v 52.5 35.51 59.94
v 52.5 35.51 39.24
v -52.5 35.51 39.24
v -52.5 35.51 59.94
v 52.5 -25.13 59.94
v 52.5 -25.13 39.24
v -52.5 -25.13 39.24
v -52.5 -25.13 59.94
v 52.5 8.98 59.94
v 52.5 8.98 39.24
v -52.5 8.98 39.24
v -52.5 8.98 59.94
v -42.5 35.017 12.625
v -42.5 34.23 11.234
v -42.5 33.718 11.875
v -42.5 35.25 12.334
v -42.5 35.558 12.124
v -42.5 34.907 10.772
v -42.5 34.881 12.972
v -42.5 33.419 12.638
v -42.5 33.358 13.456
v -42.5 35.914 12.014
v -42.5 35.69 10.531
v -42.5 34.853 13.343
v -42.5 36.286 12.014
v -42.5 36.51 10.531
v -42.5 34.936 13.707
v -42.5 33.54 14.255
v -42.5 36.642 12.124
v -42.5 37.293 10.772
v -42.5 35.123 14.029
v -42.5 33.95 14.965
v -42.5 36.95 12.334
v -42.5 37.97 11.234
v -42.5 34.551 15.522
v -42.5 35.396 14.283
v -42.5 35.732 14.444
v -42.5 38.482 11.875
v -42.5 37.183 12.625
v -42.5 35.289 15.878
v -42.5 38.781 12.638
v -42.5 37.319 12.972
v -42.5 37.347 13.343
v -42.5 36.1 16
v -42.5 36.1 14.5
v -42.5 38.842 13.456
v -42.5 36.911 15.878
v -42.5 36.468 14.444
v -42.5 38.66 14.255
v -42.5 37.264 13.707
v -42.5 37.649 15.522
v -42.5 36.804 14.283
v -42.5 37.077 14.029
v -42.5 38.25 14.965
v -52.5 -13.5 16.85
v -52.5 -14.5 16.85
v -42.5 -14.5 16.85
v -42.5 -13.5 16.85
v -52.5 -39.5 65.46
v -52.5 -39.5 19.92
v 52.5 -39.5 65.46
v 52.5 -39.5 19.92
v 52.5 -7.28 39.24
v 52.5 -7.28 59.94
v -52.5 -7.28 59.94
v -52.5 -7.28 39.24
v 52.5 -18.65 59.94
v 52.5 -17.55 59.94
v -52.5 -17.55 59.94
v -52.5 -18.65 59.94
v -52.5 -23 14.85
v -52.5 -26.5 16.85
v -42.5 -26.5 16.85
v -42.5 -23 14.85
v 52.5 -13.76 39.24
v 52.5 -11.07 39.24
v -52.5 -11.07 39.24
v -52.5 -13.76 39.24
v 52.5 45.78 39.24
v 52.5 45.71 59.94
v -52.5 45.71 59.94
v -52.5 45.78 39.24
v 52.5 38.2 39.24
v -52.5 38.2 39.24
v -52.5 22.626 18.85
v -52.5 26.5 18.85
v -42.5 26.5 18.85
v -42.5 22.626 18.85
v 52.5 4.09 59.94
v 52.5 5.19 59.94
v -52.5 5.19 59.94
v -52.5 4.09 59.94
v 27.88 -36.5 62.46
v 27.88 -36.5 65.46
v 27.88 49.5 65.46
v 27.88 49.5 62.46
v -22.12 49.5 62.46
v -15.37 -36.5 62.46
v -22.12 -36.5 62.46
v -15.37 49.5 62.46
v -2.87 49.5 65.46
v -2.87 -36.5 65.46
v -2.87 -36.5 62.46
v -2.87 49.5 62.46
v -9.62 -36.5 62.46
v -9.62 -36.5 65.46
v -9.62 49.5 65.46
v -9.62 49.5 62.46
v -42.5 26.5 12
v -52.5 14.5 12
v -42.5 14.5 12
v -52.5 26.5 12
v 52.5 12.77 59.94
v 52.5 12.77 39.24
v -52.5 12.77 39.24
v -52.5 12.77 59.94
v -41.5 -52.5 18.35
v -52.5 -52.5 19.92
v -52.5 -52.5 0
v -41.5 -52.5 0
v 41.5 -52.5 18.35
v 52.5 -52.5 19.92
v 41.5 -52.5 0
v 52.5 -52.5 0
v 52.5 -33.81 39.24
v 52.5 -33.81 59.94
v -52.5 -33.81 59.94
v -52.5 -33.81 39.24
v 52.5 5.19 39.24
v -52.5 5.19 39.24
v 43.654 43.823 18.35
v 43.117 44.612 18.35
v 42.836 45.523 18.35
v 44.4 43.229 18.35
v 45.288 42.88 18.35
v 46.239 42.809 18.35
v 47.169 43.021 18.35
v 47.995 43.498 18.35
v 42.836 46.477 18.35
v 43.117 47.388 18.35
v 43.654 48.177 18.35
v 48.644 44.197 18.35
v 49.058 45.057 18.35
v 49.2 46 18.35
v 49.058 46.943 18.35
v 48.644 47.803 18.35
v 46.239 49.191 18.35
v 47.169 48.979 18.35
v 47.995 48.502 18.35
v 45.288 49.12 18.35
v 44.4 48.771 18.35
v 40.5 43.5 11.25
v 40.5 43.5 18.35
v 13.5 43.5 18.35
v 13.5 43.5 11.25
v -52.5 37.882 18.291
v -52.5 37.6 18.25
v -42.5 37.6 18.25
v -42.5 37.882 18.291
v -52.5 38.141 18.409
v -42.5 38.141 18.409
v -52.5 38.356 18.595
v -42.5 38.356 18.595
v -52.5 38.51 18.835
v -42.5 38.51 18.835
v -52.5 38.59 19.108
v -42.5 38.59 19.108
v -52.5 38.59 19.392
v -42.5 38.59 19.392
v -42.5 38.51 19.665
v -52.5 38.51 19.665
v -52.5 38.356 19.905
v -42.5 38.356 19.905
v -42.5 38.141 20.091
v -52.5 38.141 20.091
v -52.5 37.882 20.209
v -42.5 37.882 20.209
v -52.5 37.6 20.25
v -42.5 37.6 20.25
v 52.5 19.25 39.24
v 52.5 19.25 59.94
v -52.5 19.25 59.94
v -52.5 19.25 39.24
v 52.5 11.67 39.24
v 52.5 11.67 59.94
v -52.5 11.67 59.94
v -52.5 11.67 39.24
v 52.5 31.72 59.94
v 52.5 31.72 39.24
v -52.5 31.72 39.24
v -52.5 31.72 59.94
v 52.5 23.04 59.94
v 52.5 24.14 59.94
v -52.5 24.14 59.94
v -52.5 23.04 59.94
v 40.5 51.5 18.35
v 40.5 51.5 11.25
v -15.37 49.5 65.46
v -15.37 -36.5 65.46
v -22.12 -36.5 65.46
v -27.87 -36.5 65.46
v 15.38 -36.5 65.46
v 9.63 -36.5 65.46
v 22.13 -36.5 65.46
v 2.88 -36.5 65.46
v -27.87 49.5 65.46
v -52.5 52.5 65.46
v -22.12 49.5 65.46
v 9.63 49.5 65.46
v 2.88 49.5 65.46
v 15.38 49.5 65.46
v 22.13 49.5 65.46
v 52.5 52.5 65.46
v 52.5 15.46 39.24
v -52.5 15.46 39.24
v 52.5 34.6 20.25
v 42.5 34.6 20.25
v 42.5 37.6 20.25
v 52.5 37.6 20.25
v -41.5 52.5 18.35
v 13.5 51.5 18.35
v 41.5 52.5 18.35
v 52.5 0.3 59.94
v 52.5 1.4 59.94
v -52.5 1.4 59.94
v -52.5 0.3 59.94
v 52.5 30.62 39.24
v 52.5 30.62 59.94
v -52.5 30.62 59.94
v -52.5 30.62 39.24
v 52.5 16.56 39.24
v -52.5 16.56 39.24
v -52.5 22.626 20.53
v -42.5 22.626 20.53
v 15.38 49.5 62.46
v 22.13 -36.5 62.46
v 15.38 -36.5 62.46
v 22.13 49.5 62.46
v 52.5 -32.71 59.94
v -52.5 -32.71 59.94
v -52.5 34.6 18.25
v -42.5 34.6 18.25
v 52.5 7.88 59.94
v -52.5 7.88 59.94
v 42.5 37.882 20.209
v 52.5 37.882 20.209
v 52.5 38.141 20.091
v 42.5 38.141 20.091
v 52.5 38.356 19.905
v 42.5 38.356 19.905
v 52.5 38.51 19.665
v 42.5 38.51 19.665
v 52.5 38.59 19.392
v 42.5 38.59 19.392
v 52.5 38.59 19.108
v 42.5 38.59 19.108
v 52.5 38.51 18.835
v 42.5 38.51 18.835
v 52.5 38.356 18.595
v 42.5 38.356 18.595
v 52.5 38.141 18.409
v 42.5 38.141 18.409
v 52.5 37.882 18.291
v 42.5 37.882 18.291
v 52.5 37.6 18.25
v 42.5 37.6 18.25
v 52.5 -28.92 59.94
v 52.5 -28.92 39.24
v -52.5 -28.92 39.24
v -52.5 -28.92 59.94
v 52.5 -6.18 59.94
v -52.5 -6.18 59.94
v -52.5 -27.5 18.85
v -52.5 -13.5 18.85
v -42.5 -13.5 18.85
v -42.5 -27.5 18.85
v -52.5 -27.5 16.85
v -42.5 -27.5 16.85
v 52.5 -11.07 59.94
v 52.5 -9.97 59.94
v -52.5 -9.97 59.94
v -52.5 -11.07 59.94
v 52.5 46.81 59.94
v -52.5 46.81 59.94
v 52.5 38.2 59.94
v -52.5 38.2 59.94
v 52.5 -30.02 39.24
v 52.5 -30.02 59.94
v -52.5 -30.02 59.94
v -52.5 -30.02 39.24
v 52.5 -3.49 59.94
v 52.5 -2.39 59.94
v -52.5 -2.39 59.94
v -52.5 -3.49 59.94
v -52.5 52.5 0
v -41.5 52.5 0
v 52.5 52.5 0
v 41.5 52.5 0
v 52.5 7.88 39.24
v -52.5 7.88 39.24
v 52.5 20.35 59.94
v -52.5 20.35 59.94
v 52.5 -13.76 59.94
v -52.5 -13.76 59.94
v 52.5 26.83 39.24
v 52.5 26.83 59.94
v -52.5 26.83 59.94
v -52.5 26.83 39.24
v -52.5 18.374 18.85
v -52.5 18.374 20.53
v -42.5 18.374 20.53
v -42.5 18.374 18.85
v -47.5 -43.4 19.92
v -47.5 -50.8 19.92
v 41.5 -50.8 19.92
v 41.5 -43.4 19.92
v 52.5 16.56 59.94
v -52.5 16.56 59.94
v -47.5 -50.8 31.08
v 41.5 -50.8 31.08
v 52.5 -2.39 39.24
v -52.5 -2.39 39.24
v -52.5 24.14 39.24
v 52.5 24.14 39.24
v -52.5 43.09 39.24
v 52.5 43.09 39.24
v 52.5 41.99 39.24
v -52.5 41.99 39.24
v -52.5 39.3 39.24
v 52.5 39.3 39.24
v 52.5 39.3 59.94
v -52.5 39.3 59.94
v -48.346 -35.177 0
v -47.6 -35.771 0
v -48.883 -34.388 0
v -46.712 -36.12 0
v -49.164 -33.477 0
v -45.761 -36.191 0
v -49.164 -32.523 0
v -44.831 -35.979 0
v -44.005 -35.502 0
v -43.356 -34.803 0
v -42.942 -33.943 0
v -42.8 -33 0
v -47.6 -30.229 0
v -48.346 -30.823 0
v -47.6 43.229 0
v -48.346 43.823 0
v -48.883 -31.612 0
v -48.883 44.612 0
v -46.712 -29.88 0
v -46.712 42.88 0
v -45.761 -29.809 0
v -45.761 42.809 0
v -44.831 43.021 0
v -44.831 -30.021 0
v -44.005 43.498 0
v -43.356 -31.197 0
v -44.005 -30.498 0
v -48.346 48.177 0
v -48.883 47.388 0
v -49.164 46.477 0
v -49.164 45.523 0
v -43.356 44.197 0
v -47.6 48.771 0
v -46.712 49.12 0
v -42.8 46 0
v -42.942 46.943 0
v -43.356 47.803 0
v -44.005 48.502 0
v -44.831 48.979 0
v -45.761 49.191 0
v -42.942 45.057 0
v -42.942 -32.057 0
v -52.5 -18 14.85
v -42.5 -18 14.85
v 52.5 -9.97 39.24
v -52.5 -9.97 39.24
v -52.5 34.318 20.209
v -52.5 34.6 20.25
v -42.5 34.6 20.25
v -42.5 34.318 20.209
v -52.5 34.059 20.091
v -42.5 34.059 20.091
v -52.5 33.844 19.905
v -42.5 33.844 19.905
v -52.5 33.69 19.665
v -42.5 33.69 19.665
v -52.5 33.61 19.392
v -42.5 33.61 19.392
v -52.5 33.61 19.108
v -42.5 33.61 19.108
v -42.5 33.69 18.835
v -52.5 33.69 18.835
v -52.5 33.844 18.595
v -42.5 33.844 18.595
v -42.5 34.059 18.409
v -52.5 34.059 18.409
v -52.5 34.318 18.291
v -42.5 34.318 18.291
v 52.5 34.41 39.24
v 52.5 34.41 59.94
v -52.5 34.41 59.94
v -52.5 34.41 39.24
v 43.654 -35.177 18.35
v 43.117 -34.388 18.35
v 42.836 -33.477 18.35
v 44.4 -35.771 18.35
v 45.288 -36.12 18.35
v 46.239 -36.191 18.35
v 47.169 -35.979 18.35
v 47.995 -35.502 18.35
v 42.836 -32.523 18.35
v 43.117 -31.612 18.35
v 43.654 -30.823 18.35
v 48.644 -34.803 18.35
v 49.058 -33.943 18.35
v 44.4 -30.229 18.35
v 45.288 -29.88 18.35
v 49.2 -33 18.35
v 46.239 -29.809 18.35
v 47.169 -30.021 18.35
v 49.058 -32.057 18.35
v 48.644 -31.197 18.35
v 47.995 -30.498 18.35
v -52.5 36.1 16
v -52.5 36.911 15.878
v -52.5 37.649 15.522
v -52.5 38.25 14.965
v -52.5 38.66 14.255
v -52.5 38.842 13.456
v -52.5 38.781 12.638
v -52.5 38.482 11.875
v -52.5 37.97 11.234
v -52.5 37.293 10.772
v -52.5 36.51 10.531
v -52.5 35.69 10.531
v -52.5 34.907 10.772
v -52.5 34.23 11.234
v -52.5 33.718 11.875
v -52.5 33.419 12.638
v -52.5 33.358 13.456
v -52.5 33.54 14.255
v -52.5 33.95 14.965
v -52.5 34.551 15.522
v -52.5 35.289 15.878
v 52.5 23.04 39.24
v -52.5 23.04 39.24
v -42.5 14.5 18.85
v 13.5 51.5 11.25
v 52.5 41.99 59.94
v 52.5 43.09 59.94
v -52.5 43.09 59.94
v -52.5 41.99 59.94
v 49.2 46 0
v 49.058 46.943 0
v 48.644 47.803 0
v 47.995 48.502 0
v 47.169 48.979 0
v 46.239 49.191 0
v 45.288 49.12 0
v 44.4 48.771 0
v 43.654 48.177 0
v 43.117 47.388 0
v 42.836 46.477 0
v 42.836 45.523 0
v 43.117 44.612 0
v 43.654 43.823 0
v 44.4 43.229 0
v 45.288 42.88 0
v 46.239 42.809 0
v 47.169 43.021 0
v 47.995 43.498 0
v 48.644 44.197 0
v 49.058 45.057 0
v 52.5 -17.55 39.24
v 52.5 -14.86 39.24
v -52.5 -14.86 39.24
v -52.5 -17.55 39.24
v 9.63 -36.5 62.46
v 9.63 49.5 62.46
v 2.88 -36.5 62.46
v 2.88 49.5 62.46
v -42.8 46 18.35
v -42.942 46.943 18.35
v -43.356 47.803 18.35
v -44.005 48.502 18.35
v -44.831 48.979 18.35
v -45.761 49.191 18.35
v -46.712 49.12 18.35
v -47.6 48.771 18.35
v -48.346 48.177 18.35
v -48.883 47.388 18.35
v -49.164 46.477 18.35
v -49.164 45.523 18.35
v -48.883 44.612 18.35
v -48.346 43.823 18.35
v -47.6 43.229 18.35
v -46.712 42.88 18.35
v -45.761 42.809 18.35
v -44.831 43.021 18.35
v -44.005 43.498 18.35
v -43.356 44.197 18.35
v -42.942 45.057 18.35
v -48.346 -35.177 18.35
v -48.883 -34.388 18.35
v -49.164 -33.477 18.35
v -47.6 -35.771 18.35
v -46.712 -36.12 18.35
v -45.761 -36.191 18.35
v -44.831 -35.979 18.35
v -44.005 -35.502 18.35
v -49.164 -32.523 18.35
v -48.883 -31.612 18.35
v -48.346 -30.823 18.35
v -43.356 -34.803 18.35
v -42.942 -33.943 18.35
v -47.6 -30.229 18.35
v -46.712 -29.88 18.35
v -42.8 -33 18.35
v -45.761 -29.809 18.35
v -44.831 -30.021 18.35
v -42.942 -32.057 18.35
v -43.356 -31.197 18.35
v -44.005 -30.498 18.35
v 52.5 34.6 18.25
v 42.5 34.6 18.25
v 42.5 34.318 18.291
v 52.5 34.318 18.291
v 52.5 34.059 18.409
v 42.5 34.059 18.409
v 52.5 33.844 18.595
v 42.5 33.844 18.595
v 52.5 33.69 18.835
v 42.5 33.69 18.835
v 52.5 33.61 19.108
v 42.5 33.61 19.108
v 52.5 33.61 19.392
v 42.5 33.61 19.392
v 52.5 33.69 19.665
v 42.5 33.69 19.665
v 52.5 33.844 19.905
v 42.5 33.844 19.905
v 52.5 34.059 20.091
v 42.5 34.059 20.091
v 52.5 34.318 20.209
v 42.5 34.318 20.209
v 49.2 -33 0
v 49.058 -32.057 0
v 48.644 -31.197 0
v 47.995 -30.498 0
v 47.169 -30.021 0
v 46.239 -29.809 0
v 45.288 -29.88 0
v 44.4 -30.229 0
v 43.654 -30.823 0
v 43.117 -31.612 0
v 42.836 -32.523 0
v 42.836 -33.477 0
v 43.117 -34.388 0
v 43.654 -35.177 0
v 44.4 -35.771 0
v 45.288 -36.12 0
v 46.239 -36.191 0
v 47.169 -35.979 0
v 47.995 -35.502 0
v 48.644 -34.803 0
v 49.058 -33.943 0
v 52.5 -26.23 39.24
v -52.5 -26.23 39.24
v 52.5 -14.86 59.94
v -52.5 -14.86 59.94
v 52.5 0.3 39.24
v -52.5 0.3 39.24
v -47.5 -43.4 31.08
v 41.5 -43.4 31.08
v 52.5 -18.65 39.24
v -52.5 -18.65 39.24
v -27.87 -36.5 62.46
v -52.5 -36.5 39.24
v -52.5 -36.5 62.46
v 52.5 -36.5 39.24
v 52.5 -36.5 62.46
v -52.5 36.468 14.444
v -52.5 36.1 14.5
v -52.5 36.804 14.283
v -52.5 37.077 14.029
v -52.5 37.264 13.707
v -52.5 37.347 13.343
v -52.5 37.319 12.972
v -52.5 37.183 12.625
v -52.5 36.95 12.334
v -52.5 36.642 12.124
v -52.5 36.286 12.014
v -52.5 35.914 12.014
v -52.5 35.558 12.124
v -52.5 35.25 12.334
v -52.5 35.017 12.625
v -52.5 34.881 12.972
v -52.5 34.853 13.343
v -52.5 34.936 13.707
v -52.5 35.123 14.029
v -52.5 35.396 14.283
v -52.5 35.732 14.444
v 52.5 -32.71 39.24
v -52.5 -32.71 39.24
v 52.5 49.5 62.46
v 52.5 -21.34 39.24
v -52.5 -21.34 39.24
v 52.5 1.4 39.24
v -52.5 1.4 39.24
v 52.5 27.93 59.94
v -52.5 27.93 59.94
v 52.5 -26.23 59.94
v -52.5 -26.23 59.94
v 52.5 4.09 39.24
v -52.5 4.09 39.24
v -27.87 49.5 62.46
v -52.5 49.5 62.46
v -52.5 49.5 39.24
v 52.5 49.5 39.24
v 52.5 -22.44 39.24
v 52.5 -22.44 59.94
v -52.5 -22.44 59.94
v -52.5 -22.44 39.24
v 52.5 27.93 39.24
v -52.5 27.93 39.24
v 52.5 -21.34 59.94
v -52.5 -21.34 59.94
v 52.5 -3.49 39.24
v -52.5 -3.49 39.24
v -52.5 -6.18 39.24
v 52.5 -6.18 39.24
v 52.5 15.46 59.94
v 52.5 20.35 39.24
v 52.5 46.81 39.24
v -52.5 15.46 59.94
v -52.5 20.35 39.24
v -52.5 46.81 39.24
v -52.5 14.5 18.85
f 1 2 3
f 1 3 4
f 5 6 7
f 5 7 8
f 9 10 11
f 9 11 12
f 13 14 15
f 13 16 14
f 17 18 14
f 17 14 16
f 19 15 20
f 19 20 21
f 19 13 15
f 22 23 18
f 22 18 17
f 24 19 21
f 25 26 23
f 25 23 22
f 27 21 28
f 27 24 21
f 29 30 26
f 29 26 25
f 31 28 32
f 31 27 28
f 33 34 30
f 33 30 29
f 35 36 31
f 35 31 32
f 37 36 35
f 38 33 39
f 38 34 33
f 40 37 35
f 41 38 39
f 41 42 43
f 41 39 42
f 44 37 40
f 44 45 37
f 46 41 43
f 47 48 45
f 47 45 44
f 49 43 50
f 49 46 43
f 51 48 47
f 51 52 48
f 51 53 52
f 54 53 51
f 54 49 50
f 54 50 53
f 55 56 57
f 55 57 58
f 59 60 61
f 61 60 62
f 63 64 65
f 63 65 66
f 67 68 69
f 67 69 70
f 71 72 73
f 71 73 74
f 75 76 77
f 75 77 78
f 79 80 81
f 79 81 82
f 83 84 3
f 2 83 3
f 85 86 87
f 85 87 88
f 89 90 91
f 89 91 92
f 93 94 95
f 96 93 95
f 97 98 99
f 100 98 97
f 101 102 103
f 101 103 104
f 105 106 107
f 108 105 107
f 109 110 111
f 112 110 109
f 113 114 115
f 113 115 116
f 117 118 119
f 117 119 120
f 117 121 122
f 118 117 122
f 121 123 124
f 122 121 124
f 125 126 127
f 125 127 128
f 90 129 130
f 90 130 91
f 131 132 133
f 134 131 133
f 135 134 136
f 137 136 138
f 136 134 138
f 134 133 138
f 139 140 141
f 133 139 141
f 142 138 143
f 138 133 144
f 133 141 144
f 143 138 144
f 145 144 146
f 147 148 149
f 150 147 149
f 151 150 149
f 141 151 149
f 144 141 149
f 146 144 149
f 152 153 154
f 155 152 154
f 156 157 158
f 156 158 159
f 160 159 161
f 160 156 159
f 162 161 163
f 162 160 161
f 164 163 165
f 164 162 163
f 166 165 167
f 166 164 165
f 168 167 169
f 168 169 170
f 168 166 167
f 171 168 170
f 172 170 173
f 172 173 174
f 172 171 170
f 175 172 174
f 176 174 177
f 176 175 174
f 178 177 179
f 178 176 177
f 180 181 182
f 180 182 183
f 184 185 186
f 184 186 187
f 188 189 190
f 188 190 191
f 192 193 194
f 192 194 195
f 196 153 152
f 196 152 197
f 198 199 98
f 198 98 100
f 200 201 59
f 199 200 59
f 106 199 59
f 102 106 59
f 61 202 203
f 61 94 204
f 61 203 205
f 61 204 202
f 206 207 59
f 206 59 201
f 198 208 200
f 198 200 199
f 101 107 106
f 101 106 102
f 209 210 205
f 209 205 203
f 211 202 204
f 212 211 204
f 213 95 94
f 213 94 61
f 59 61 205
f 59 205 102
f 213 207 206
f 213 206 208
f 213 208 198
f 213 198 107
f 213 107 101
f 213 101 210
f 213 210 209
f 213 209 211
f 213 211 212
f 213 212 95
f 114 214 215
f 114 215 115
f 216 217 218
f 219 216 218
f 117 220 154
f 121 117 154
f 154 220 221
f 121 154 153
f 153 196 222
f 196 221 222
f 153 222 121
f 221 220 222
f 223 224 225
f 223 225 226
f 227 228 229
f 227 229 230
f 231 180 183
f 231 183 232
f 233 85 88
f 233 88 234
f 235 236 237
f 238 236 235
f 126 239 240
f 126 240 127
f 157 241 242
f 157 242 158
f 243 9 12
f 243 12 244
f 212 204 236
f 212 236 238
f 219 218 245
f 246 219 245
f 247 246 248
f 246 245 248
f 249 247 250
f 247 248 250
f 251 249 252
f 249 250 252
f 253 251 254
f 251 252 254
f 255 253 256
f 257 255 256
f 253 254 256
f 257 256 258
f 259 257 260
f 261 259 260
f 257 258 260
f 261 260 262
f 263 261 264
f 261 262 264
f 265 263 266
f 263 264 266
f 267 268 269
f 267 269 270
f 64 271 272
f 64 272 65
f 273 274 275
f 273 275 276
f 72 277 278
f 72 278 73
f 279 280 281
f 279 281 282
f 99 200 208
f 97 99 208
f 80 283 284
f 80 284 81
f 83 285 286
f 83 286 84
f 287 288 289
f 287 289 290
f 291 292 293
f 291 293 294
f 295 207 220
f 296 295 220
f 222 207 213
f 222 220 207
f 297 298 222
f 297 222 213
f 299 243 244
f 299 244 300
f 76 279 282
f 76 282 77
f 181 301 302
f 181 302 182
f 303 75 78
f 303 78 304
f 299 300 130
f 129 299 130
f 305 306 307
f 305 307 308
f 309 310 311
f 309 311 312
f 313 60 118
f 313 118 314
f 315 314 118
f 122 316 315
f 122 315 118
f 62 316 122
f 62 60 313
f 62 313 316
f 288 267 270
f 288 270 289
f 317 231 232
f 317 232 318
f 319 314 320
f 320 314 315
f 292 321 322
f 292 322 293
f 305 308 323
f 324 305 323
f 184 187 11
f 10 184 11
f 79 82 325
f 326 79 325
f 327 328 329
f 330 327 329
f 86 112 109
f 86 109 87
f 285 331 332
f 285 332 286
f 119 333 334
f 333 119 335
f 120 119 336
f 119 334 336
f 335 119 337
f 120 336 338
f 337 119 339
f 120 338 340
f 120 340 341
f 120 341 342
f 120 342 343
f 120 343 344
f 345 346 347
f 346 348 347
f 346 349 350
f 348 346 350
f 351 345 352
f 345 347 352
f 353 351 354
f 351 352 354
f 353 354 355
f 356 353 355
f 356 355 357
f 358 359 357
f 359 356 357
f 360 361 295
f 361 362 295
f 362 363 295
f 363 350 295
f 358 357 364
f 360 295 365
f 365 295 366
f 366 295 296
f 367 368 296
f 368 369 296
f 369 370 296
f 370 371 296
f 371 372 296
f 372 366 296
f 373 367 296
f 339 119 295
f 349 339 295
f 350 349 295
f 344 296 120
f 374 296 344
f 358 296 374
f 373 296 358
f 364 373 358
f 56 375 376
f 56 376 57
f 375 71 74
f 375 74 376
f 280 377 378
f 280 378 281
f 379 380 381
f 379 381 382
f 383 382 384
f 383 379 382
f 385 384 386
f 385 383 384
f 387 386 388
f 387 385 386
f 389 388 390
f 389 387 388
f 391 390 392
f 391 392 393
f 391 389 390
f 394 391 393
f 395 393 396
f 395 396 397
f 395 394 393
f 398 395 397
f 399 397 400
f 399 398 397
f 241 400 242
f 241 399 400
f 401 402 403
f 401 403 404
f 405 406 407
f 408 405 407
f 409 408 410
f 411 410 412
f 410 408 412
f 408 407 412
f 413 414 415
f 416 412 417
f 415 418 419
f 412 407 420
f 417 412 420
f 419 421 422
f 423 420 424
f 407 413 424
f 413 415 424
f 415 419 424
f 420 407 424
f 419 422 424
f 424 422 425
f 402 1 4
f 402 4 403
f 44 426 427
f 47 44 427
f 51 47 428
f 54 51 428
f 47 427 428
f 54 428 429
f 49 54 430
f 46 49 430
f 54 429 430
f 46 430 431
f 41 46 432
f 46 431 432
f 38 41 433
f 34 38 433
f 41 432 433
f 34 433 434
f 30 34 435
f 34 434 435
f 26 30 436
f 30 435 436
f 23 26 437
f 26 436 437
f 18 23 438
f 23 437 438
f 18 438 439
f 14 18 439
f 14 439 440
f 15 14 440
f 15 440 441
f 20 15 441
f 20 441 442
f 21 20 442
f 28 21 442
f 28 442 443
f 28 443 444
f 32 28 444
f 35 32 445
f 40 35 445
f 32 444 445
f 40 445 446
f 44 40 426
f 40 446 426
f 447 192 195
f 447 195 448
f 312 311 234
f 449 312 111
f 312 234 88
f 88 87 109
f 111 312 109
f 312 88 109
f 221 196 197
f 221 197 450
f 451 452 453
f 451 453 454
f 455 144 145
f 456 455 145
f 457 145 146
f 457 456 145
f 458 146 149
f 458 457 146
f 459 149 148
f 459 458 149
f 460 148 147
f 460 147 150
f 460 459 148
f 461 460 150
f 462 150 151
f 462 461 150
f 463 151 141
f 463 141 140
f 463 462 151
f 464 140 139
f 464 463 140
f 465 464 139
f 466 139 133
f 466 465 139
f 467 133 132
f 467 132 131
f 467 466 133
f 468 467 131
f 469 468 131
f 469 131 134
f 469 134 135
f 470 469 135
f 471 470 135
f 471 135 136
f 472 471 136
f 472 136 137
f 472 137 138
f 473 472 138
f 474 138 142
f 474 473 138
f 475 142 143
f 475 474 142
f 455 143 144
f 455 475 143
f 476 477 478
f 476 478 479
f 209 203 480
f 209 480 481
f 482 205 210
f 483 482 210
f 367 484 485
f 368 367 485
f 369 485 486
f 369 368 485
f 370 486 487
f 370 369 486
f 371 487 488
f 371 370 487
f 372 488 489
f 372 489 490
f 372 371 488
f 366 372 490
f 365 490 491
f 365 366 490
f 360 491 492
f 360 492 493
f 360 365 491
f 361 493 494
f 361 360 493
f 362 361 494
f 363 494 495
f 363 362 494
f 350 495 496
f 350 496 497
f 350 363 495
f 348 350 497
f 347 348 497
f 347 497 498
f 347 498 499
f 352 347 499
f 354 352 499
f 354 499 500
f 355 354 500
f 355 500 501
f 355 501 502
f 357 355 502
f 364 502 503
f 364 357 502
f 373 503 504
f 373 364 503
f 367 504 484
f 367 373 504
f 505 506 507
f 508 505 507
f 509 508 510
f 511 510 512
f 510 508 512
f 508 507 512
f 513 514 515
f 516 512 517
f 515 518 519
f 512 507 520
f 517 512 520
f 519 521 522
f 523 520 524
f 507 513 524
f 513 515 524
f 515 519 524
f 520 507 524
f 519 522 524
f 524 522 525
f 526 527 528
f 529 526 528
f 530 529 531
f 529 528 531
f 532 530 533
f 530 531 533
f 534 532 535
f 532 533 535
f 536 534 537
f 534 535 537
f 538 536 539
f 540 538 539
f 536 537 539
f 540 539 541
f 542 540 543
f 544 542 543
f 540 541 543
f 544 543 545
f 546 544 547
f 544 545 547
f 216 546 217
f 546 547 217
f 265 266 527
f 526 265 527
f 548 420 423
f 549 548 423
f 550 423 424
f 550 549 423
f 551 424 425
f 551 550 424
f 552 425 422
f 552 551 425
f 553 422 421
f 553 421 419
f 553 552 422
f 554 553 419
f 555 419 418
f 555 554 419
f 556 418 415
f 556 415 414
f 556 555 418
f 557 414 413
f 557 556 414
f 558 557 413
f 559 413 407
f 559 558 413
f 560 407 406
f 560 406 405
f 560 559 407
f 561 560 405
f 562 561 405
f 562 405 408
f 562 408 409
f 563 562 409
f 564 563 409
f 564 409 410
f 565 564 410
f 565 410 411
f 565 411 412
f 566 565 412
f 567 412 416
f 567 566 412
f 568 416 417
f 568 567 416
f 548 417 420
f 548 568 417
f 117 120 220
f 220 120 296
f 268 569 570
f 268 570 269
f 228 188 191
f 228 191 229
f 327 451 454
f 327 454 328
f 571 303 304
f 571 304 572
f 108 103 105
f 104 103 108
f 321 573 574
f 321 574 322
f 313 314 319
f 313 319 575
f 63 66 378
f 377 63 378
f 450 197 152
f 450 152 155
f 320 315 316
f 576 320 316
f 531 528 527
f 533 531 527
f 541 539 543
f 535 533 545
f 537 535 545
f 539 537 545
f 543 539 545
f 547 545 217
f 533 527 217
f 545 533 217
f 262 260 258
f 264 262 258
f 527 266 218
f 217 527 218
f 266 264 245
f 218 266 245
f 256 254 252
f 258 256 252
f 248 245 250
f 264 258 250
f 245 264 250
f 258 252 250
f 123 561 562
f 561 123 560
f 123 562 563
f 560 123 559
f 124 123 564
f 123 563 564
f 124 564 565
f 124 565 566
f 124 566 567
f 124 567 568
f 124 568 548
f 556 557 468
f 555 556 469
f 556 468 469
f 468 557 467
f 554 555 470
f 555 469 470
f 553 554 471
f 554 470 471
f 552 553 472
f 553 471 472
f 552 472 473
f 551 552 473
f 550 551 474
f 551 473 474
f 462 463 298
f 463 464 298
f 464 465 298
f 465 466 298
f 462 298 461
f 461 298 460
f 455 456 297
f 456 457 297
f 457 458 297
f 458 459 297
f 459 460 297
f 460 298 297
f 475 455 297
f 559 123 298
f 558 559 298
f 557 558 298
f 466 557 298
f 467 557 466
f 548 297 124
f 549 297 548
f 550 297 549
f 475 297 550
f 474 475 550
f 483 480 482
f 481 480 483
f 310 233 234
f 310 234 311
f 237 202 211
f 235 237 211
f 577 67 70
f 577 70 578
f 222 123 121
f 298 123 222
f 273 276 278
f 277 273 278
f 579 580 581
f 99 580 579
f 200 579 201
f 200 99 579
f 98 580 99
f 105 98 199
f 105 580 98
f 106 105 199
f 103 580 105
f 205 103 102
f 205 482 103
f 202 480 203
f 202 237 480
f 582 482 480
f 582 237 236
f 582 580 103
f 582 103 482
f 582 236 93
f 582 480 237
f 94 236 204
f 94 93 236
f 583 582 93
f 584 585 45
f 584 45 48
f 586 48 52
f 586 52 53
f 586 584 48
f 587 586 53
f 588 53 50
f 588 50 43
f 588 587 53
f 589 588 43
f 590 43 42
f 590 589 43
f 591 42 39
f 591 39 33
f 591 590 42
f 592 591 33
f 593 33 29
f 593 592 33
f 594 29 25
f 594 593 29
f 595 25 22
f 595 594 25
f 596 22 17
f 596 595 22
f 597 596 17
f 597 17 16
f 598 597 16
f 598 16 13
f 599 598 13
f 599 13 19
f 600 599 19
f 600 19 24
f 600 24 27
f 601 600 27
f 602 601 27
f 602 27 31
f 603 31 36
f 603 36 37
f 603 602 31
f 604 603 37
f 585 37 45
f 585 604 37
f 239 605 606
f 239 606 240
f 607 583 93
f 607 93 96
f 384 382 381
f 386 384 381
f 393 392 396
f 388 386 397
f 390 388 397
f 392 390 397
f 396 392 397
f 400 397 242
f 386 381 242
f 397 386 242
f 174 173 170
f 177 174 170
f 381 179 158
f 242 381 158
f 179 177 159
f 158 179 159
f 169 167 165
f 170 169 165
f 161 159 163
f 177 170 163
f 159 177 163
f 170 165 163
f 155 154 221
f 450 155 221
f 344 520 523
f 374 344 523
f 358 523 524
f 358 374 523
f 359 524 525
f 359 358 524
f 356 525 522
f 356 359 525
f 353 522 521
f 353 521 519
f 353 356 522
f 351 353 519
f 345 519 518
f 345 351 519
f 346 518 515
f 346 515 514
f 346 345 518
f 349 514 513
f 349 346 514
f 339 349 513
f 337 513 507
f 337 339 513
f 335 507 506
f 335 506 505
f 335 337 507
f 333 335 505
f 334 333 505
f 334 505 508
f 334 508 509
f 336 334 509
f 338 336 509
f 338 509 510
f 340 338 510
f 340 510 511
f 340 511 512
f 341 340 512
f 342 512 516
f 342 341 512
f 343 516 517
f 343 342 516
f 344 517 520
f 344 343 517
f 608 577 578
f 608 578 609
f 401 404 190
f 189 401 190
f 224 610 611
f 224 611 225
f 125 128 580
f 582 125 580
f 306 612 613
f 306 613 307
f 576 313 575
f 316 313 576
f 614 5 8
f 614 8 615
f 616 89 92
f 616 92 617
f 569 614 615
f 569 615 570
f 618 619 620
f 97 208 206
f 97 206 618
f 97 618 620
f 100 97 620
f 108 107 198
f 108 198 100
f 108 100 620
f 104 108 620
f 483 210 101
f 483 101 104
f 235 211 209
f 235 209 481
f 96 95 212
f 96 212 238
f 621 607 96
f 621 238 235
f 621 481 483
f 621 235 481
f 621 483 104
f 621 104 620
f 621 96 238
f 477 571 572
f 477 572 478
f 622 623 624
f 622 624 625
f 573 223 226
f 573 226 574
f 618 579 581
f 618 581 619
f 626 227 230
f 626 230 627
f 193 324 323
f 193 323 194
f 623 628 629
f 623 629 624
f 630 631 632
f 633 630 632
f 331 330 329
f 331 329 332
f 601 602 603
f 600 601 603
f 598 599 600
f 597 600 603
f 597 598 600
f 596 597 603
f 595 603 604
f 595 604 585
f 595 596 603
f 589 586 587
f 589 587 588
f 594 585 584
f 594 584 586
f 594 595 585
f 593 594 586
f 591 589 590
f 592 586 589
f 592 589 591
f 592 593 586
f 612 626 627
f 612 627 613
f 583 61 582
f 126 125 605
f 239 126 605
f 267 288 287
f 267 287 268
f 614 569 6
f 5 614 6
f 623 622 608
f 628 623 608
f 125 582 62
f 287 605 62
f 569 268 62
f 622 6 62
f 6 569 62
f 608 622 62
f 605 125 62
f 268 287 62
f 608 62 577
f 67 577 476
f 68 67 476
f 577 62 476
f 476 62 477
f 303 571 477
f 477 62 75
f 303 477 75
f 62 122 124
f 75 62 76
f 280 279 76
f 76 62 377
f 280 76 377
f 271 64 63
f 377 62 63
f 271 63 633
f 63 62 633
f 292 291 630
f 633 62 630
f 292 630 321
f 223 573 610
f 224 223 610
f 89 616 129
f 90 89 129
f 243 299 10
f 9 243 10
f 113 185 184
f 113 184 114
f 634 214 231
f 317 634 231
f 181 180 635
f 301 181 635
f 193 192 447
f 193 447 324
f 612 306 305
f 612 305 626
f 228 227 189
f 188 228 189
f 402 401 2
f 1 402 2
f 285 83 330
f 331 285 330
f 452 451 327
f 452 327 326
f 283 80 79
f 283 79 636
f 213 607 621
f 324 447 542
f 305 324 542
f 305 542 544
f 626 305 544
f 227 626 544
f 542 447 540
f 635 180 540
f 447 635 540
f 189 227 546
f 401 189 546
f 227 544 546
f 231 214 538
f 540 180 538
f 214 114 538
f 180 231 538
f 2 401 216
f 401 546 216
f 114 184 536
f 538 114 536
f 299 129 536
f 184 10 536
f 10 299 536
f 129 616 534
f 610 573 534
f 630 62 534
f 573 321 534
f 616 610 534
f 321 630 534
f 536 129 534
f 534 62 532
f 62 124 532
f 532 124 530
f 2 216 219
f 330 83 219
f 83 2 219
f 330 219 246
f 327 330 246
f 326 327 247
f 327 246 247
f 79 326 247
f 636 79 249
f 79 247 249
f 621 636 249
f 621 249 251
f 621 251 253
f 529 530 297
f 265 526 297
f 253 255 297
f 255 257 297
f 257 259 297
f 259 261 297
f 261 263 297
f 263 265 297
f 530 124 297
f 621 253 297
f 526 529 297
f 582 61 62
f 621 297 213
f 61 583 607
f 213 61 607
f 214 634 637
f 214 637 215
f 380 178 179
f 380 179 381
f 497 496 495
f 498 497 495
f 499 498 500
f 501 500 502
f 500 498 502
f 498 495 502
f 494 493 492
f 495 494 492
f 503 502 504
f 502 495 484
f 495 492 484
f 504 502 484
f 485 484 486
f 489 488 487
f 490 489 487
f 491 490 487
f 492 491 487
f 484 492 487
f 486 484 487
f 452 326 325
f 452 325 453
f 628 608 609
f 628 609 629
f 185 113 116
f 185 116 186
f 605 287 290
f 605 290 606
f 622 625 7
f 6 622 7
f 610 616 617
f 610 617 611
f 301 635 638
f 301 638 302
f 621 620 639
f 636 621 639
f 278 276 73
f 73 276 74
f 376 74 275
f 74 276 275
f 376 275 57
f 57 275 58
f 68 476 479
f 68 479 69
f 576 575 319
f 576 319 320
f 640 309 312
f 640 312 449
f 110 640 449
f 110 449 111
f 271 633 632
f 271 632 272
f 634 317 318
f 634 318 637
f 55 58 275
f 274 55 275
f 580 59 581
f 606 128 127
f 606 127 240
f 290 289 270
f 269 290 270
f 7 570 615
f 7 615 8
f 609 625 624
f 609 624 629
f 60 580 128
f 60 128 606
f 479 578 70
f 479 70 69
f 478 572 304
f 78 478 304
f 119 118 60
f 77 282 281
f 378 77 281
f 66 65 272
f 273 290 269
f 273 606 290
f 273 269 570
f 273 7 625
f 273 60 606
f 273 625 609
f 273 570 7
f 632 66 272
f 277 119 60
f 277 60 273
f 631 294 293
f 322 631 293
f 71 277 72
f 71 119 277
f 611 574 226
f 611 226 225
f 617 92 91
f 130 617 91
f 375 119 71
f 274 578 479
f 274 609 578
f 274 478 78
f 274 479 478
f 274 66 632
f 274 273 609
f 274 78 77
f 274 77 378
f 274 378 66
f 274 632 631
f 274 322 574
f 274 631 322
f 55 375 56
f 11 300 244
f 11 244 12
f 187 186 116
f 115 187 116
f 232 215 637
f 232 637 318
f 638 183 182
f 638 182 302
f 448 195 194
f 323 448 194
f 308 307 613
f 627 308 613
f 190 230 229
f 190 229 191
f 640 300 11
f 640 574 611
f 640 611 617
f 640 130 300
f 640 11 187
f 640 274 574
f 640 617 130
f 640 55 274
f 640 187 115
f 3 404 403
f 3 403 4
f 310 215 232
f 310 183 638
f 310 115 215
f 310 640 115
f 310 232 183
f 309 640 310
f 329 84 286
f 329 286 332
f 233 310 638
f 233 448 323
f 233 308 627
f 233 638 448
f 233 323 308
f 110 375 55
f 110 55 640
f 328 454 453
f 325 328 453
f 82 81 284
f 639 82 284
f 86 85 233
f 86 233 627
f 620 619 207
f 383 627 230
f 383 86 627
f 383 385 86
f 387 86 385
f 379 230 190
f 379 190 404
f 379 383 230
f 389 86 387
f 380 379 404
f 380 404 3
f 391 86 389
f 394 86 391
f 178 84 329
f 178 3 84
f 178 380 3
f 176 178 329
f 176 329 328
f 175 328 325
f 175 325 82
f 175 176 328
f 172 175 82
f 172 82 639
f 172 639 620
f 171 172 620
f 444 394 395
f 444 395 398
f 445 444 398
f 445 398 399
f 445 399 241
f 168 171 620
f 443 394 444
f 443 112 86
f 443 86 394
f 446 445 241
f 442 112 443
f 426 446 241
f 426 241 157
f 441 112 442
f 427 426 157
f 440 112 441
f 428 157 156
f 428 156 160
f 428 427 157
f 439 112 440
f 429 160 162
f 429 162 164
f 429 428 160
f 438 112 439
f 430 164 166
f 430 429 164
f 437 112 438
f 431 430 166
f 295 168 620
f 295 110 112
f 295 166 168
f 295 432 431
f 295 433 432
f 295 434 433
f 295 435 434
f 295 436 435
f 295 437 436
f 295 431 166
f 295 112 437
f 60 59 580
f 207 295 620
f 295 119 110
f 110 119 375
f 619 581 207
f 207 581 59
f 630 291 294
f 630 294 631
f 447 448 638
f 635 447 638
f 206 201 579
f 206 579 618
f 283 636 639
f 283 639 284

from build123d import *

# Parameters (mm, degrees)
ESQUISSE1_W             = 11
ESQUISSE1_H             = 105
ESQUISSE1_R             = 3.2
BOSS_EXTRU_1_DEPTH      = 18.35
BOSS_EXTRU_1_2_DEPTH    = 18.35
ESQUISSE2_W             = 105
ESQUISSE2_H             = 105
BOSS_EXTRU_2_DEPTH      = 1.57
ESQUISSE3_W             = 105
ESQUISSE3_H             = 92
BOSS_EXTRU_3_DEPTH      = 45.54
ESQUISSE4_W             = 89
ESQUISSE4_H             = 7.4
BOSS_EXTRU_4_DEPTH      = 11.16
ENL_V_MAT_EXTRU_1_REACH = 136.411
ENL_V_MAT_EXTRU_2_REACH = 100.982
ESQUISSE7_W             = 5.75
ESQUISSE7_H             = 86
ESQUISSE8_W             = 27
ESQUISSE8_H             = 8
BOSS_EXTRU_5_DEPTH      = 7.1
ESQUISSE9_R             = 2.75
ESQUISSE9_R_2           = 1.25
ENL_V_MAT_EXTRU_3_DEPTH = 10
ENL_V_START             = -10
ENL_V_MAT_EXTRU_4_DEPTH = 10


with BuildPart() as part:
    # Esquisse1 → Boss.-Extru.1 (new body)
    with BuildSketch(Plane.XY):
        with Locations((-47, 0)):
            Rectangle(ESQUISSE1_W, ESQUISSE1_H)
        with Locations((-46, 46)):
            Circle(ESQUISSE1_R, mode=Mode.SUBTRACT)
        with Locations((-46, -33)):
            Circle(ESQUISSE1_R, mode=Mode.SUBTRACT)
    extrude(amount=BOSS_EXTRU_1_DEPTH)



with BuildPart() as body_2:
    # Esquisse1 → Boss.-Extru.1 2 (new body)
    with BuildSketch(Plane.XY):
        with Locations((47, 0)):
            Rectangle(ESQUISSE1_W, ESQUISSE1_H)
        with Locations((46, 46)):
            Circle(ESQUISSE1_R, mode=Mode.SUBTRACT)
        with Locations((46, -33)):
            Circle(ESQUISSE1_R, mode=Mode.SUBTRACT)
    extrude(amount=BOSS_EXTRU_1_2_DEPTH)


with BuildPart() as part_1:
    add(part.part)

    add(body_2.part)  # Boss.-Extru.2 merges body 2
    # Esquisse2 → Boss.-Extru.2 (add)
    with BuildSketch(Plane.XY.offset(18.35)):
        Rectangle(ESQUISSE2_W, ESQUISSE2_H)
    extrude(amount=BOSS_EXTRU_2_DEPTH)

    # Esquisse3 → Boss.-Extru.3 (add)
    with BuildSketch(Plane.XY.offset(19.92)):
        with Locations((0, 6.5)):
            Rectangle(ESQUISSE3_W, ESQUISSE3_H)
    extrude(amount=BOSS_EXTRU_3_DEPTH)

    # Esquisse4 → Boss.-Extru.4 (add)
    with BuildSketch(Plane.XY.offset(19.92)):
        with Locations((-3, -47.1)):
            Rectangle(ESQUISSE4_W, ESQUISSE4_H)
    extrude(amount=BOSS_EXTRU_4_DEPTH)

    # Esquisse6 → Enlèv. mat.-Extru.1 (cut, up to next)
    with BuildSketch(Plane(origin=(52.5, 0, 0), x_dir=(0, 0, -1), z_dir=(1, 0, 0)), mode=Mode.PRIVATE) as enl_v_mat_extru_1_sk1:
        Polygon((-62.46, -36.5), (-62.46, 49.5), (-39.24, 49.5), (-39.24, 46.81), (-59.94, 46.81), (-59.94, 45.71), (-39.24, 45.78), (-39.24, 43.09), (-59.94, 43.09), (-59.94, 41.99), (-39.24, 41.99), (-39.24, 39.3), (-59.94, 39.3), (-59.94, 38.2), (-39.24, 38.2), (-39.24, 35.51), (-59.94, 35.51), (-59.94, 34.41), (-39.24, 34.41), (-39.24, 31.72), (-59.94, 31.72), (-59.94, 30.62), (-39.24, 30.62), (-39.24, 27.93), (-59.94, 27.93), (-59.94, 26.83), (-39.24, 26.83), (-39.24, 24.14), (-59.94, 24.14), (-59.94, 23.04), (-39.24, 23.04), (-39.24, 20.35), (-59.94, 20.35), (-59.94, 19.25), (-39.24, 19.25), (-39.24, 16.56), (-59.94, 16.56), (-59.94, 15.46), (-39.24, 15.46), (-39.24, 12.77), (-59.94, 12.77), (-59.94, 11.67), (-39.24, 11.67), (-39.24, 8.98), (-59.94, 8.98), (-59.94, 7.88), (-39.24, 7.88), (-39.24, 5.19), (-59.94, 5.19), (-59.94, 4.09), (-39.24, 4.09), (-39.24, 1.4), (-59.94, 1.4), (-59.94, 0.3), (-39.24, 0.3), (-39.24, -2.39), (-59.94, -2.39), (-59.94, -3.49), (-39.24, -3.49), (-39.24, -6.18), (-59.94, -6.18), (-59.94, -7.28), (-39.24, -7.28), (-39.24, -9.97), (-59.94, -9.97), (-59.94, -11.07), (-39.24, -11.07), (-39.24, -13.76), (-59.94, -13.76), (-59.94, -14.86), (-39.24, -14.86), (-39.24, -17.55), (-59.94, -17.55), (-59.94, -18.65), (-39.24, -18.65), (-39.24, -21.34), (-59.94, -21.34), (-59.94, -22.44), (-39.24, -22.44), (-39.24, -25.13), (-59.94, -25.13), (-59.94, -26.23), (-39.24, -26.23), (-39.24, -28.92), (-59.94, -28.92), (-59.94, -30.02), (-39.24, -30.02), (-39.24, -32.71), (-59.94, -32.71), (-59.94, -33.81), (-39.24, -33.81), (-39.24, -36.5), align=None)
    enl_v_mat_extru_1_tool1 = extrude(enl_v_mat_extru_1_sk1.sketch, amount=-ENL_V_MAT_EXTRU_1_REACH, mode=Mode.PRIVATE) & part_1.part
    add(enl_v_mat_extru_1_tool1.solids().sort_by_distance((52.5, 6.508342, 51.269436))[0], mode=Mode.SUBTRACT)

    # Esquisse7 → Enlèv. mat.-Extru.2 (cut, up to next)
    with BuildSketch(Plane.XY.offset(65.46), mode=Mode.PRIVATE) as enl_v_mat_extru_2_sk1:
        with Locations((0.005, 6.5)):
            Rectangle(ESQUISSE7_W, ESQUISSE7_H)
    enl_v_mat_extru_2_tool1 = extrude(enl_v_mat_extru_2_sk1.sketch, amount=-ENL_V_MAT_EXTRU_2_REACH, mode=Mode.PRIVATE) & part_1.part
    # Esquisse7 → Enlèv. mat.-Extru.2 (cut, up to next)
    with BuildSketch(Plane.XY.offset(65.46), mode=Mode.PRIVATE) as enl_v_mat_extru_2_sk2:
        with Locations((-12.495, 6.5)):
            Rectangle(ESQUISSE7_W, ESQUISSE7_H)
    enl_v_mat_extru_2_tool2 = extrude(enl_v_mat_extru_2_sk2.sketch, amount=-ENL_V_MAT_EXTRU_2_REACH, mode=Mode.PRIVATE) & part_1.part
    # Esquisse7 → Enlèv. mat.-Extru.2 (cut, up to next)
    with BuildSketch(Plane.XY.offset(65.46), mode=Mode.PRIVATE) as enl_v_mat_extru_2_sk3:
        with Locations((-24.995, 6.5)):
            Rectangle(ESQUISSE7_W, ESQUISSE7_H)
    enl_v_mat_extru_2_tool3 = extrude(enl_v_mat_extru_2_sk3.sketch, amount=-ENL_V_MAT_EXTRU_2_REACH, mode=Mode.PRIVATE) & part_1.part
    # Esquisse7 → Enlèv. mat.-Extru.2 (cut, up to next)
    with BuildSketch(Plane.XY.offset(65.46), mode=Mode.PRIVATE) as enl_v_mat_extru_2_sk4:
        with Locations((25.005, 6.5)):
            Rectangle(ESQUISSE7_W, ESQUISSE7_H)
    enl_v_mat_extru_2_tool4 = extrude(enl_v_mat_extru_2_sk4.sketch, amount=-ENL_V_MAT_EXTRU_2_REACH, mode=Mode.PRIVATE) & part_1.part
    # Esquisse7 → Enlèv. mat.-Extru.2 (cut, up to next)
    with BuildSketch(Plane.XY.offset(65.46), mode=Mode.PRIVATE) as enl_v_mat_extru_2_sk5:
        with Locations((12.505, 6.5)):
            Rectangle(ESQUISSE7_W, ESQUISSE7_H)
    enl_v_mat_extru_2_tool5 = extrude(enl_v_mat_extru_2_sk5.sketch, amount=-ENL_V_MAT_EXTRU_2_REACH, mode=Mode.PRIVATE) & part_1.part
    add(enl_v_mat_extru_2_tool1.solids().sort_by_distance((0.005, 6.5, 65.46))[0], mode=Mode.SUBTRACT)
    add(enl_v_mat_extru_2_tool2.solids().sort_by_distance((-12.495, 6.5, 65.46))[0], mode=Mode.SUBTRACT)
    add(enl_v_mat_extru_2_tool3.solids().sort_by_distance((-24.995, 6.5, 65.46))[0], mode=Mode.SUBTRACT)
    add(enl_v_mat_extru_2_tool4.solids().sort_by_distance((25.005, 6.5, 65.46))[0], mode=Mode.SUBTRACT)
    add(enl_v_mat_extru_2_tool5.solids().sort_by_distance((12.505, 6.5, 65.46))[0], mode=Mode.SUBTRACT)

    # Esquisse8 → Boss.-Extru.5 (add)
    with BuildSketch(Plane(origin=(0, 0, 18.35), x_dir=(-1, 0, 0), z_dir=(0, 0, -1))):
        with Locations((-27, 47.5)):
            Rectangle(ESQUISSE8_W, ESQUISSE8_H)
    extrude(amount=BOSS_EXTRU_5_DEPTH)

    # Esquisse9 → Enlèv. mat.-Extru.3 (cut)
    # profile 1 of 4: a face of its own
    with BuildSketch(Plane.ZY.offset(52.5)):
        with Locations((13.25, 36.1)):
            Circle(ESQUISSE9_R)
        with Locations((13.25, 36.1)):
            Circle(ESQUISSE9_R_2, mode=Mode.SUBTRACT)
    # profile 2 of 4: a face of its own
    with BuildSketch(Plane.ZY.offset(52.5)):
        Polygon((18.85, 26.5), (18.85, 22.626049106), (20.53, 22.626049106), (20.53, 18.373950894), (18.85, 18.373950894), (18.85, 14.5), (12, 14.5), (12, 26.5), align=None)
    # profile 3 of 4: a face of its own
    with BuildSketch(Plane.ZY.offset(52.5)):
        with BuildLine():
            Line((20.25, 37.6), (20.25, 34.6))
            ThreePointArc((20.25, 34.6), (19.25, 33.6), (18.25, 34.6))
            Line((18.25, 34.6), (18.25, 37.6))
            ThreePointArc((18.25, 37.6), (19.25, 38.6), (20.25, 37.6))
        make_face()
    # profile 4 of 4: a face of its own
    with BuildSketch(Plane.ZY.offset(52.5)):
        Polygon((18.85, -13.5), (18.85, -27.5), (16.85, -27.5), (16.85, -26.5), (14.85, -23), (14.85, -18), (16.85, -14.5), (16.85, -13.5), align=None)
    extrude(amount=-ENL_V_MAT_EXTRU_3_DEPTH, mode=Mode.SUBTRACT)

    # Esquisse10 → Enlèv. mat.-Extru.4 (cut)
    with BuildSketch(Plane(origin=(52.5, 0, 0), x_dir=(0, 0, -1), z_dir=(1, 0, 0)).offset(ENL_V_START)):
        with BuildLine():
            Line((-20.25, 34.6), (-20.25, 37.6))
            ThreePointArc((-20.25, 37.6), (-19.25, 38.6), (-18.25, 37.6))
            Line((-18.25, 37.6), (-18.25, 34.6))
            ThreePointArc((-18.25, 34.6), (-19.25, 33.6), (-20.25, 34.6))
        make_face()
    extrude(amount=ENL_V_MAT_EXTRU_4_DEPTH, mode=Mode.SUBTRACT)


solid = part_1.part
